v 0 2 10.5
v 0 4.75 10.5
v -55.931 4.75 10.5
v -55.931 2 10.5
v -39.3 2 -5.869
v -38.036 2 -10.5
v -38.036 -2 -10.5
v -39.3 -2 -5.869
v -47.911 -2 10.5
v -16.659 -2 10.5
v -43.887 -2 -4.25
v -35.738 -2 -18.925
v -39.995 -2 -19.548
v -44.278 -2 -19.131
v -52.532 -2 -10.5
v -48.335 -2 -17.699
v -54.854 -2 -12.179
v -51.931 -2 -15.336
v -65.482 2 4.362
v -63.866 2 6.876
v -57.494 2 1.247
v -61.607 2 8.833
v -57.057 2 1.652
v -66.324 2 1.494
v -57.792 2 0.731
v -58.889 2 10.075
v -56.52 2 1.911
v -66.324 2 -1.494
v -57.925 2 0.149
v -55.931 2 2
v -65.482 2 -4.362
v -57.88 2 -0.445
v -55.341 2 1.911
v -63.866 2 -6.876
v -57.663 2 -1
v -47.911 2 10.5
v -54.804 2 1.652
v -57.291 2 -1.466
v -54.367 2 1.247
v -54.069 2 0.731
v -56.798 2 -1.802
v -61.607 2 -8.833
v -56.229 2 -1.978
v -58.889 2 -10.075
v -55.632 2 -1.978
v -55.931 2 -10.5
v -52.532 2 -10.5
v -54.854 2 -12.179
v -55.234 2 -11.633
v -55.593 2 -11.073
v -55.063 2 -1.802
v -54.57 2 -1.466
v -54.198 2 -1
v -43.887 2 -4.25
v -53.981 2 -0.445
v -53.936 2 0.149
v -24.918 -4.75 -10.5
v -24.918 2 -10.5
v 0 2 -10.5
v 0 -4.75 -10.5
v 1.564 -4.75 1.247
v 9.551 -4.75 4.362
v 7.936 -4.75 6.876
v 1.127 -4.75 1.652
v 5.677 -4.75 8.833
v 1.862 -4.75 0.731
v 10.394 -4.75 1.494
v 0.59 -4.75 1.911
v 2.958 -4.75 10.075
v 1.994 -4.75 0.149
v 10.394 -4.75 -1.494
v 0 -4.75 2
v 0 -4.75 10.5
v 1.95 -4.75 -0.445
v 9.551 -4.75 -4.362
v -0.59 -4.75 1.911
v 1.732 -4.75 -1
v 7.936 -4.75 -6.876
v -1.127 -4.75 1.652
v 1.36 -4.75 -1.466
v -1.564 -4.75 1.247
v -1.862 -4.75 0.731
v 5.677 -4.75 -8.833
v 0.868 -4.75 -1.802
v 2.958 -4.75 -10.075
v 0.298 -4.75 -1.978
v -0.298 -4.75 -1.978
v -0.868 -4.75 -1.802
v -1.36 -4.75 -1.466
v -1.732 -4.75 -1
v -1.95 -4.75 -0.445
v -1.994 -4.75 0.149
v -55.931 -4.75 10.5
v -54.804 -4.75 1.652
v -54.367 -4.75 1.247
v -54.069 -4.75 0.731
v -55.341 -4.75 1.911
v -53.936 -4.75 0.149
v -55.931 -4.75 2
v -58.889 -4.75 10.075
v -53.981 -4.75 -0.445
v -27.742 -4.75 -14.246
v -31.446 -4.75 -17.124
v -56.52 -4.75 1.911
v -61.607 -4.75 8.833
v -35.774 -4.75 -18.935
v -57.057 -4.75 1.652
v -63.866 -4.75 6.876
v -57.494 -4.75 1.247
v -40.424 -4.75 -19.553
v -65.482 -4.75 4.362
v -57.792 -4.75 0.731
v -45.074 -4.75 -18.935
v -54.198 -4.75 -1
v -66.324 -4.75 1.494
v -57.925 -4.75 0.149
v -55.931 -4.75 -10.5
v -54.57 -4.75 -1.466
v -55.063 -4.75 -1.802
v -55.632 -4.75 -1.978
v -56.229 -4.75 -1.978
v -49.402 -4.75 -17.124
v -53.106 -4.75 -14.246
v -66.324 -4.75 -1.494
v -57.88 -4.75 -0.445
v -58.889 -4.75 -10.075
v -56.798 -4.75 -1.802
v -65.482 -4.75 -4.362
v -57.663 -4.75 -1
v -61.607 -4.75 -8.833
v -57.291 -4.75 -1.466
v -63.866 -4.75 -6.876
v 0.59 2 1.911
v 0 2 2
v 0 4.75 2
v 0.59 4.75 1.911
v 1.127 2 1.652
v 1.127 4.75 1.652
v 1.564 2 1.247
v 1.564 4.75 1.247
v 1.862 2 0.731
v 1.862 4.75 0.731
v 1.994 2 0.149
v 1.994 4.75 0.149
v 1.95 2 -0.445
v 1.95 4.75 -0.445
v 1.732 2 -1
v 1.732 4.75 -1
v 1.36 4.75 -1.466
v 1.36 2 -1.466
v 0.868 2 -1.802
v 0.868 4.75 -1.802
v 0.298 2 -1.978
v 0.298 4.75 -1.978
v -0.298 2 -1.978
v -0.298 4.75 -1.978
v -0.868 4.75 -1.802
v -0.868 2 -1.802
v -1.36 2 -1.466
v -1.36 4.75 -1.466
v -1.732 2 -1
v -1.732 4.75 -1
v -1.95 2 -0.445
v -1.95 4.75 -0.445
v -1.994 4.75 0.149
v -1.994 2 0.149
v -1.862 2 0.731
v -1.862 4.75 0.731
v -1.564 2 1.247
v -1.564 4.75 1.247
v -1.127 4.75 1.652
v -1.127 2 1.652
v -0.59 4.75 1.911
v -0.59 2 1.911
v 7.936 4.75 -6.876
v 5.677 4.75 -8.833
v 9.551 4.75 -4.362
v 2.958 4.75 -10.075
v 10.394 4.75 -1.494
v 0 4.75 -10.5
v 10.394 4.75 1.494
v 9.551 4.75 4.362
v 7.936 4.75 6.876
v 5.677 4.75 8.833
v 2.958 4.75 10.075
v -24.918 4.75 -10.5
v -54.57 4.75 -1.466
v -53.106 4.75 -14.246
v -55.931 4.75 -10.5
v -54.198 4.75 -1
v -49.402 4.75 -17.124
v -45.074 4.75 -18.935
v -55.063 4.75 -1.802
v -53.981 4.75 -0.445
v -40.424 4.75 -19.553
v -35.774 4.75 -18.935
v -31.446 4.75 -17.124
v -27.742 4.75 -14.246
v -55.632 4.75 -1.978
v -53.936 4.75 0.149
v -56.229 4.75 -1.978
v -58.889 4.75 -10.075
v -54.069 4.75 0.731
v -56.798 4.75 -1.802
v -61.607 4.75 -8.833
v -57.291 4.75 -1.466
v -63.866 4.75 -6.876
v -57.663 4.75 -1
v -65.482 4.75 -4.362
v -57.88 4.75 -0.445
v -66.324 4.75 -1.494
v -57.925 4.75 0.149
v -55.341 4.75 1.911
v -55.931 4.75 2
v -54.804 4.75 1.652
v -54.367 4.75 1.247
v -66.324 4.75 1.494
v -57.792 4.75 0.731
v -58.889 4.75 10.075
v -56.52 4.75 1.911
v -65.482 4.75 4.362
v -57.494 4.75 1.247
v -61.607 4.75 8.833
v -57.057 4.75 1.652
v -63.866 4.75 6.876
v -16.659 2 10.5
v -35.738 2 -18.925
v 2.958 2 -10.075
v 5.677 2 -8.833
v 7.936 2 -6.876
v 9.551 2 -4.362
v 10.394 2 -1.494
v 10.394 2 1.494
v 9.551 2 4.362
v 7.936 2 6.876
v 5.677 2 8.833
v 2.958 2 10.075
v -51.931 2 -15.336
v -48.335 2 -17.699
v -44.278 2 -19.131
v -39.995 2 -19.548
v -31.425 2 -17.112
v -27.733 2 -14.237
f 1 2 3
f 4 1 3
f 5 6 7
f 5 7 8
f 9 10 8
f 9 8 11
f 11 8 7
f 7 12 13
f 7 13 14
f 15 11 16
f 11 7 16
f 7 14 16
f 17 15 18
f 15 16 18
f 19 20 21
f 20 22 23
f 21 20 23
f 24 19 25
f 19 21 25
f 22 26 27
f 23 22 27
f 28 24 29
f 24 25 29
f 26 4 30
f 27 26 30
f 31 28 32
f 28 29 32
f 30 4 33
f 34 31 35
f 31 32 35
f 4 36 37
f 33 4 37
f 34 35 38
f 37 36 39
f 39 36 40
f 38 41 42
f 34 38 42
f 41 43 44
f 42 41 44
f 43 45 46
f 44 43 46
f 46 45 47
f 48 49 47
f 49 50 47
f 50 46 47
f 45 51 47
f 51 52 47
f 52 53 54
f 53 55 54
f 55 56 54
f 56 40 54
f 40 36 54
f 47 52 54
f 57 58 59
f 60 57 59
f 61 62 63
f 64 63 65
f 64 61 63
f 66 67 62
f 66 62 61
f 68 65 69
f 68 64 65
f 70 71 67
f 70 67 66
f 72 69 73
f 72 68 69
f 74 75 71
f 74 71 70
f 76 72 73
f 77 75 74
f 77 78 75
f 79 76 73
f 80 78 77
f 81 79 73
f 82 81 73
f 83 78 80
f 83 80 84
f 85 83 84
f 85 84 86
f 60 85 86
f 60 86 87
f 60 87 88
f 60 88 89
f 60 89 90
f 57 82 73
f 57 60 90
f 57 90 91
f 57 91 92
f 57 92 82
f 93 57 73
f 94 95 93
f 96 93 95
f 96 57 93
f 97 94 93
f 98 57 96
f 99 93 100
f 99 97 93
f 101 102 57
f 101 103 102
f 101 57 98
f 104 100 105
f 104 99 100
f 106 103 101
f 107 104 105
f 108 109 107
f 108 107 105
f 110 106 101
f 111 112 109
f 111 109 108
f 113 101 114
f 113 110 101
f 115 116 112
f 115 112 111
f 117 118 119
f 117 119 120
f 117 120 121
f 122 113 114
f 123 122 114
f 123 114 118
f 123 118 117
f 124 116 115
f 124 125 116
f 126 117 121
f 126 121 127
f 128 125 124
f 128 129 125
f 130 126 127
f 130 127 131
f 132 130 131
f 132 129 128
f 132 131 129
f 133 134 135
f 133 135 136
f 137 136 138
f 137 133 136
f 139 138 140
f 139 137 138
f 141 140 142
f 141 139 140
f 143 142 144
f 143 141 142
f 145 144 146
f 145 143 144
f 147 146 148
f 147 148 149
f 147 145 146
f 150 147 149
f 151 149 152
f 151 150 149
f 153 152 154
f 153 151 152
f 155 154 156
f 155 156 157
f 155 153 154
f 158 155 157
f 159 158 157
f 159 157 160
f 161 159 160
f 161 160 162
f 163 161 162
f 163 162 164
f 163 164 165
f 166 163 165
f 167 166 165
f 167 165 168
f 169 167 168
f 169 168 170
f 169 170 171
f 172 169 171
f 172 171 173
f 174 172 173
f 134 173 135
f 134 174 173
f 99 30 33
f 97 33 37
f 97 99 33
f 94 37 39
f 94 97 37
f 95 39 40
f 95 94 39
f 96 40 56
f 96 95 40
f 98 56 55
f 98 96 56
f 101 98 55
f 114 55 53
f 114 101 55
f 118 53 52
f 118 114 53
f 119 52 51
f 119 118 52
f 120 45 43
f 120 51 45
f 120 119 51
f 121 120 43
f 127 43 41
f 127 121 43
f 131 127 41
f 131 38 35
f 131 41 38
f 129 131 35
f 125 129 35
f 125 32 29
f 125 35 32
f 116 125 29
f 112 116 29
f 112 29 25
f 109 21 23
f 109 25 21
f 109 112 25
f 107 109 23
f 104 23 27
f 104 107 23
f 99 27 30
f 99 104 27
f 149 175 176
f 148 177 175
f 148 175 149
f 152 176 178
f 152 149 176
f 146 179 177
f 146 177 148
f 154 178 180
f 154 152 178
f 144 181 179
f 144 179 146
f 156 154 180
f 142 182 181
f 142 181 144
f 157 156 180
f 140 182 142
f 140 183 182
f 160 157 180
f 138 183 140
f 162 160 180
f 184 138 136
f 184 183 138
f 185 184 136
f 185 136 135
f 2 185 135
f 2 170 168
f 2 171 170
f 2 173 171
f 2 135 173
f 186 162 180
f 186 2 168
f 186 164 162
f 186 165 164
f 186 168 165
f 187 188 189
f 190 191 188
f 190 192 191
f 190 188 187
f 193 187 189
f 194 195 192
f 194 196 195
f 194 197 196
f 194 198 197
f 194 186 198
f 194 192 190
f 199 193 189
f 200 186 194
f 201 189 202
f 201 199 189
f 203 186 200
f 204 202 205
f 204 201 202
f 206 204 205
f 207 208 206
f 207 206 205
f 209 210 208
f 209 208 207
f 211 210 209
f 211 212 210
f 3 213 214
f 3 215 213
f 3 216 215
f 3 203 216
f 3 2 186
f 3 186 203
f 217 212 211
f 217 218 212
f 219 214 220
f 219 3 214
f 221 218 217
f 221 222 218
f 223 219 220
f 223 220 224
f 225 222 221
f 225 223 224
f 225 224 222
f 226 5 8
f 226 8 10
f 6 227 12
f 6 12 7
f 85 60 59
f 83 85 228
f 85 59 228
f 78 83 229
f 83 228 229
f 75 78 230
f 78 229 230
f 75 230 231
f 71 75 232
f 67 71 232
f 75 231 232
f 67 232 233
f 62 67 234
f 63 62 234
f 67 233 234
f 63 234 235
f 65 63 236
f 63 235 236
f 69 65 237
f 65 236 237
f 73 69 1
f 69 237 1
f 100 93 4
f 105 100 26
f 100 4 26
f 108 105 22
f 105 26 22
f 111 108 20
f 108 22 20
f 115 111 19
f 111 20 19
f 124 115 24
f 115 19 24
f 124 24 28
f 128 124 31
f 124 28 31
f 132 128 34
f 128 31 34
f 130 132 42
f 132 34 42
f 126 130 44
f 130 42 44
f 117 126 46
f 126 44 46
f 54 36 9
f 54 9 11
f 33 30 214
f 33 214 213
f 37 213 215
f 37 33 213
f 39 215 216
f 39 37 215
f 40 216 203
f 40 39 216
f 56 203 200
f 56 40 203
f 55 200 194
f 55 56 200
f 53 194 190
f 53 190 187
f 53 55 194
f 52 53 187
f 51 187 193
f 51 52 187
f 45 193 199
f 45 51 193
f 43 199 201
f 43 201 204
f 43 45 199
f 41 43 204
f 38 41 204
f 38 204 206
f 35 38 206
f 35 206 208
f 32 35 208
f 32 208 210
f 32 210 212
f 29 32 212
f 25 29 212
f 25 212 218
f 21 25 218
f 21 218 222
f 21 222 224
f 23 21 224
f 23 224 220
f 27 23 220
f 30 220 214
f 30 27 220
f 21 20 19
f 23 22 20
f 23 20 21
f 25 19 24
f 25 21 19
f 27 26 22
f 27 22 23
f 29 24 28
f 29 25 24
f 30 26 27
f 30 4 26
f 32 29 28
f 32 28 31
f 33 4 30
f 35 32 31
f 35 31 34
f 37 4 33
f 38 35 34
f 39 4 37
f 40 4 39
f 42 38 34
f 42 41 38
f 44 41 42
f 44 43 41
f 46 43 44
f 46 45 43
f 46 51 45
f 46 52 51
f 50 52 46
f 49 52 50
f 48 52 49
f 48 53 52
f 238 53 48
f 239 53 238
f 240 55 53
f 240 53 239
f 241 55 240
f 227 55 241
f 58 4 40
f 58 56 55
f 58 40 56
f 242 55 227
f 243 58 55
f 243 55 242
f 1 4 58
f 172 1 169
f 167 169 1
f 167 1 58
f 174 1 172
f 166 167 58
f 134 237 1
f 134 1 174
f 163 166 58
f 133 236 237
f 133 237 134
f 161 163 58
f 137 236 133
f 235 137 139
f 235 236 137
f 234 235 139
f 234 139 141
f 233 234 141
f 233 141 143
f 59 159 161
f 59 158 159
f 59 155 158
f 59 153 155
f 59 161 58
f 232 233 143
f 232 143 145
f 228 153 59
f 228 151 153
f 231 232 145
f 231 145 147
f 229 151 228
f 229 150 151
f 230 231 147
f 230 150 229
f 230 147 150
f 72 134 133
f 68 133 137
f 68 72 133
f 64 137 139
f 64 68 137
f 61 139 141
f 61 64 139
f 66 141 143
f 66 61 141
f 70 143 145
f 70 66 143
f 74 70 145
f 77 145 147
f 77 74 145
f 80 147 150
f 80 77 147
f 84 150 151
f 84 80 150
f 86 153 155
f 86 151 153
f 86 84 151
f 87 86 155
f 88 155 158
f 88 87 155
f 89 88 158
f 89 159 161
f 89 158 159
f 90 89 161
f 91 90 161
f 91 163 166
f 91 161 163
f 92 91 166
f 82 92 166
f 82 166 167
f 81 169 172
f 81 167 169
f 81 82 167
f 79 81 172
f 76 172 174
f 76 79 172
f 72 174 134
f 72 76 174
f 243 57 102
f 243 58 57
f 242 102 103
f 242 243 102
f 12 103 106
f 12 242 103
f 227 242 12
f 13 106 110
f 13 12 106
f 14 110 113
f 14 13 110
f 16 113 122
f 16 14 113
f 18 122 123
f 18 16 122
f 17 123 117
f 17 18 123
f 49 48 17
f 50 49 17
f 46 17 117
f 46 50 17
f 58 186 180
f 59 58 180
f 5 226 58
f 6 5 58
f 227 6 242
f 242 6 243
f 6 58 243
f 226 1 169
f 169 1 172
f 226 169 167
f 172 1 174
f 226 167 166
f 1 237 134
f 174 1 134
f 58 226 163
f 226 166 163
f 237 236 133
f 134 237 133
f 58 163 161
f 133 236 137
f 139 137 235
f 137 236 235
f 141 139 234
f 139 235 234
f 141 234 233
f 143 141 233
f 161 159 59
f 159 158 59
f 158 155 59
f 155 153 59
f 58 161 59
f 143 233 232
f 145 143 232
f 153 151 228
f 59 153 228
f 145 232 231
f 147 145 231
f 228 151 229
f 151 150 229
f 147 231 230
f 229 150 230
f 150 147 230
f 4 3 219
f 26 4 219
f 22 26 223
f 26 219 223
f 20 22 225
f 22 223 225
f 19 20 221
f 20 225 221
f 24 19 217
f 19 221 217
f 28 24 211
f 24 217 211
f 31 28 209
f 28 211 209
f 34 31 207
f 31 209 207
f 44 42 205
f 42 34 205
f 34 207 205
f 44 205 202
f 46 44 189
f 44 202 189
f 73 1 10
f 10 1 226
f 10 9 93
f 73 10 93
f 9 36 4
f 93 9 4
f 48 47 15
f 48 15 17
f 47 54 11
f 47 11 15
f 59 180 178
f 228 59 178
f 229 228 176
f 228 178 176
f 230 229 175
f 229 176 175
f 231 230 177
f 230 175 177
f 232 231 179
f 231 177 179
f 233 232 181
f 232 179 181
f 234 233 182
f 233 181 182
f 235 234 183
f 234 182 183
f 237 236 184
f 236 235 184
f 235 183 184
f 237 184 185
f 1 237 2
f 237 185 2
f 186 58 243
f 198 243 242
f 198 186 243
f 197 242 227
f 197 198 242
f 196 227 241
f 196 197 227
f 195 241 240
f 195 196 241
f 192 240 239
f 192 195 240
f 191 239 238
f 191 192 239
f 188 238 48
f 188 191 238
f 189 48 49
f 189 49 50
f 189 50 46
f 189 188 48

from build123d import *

# Parameters (mm, degrees)
SKETCH1_R                       = 2
BOSS_EXTRUDE1_DEPTH             = 4.75
CUT_EXTRUDE1_DEPTH              = 2
BOSS_EXTRUDE2_REACH             = 69.423
BOSS_EXTRUDE2_DIRECTION_2_REACH = 69.423
CUT_EXTRUDE2_DEPTH              = 2


with BuildPart() as part:
    # Sketch1 → Boss-Extrude1 (new, symmetric)
    with BuildSketch(Plane(origin=(0, 0, 0), x_dir=(1, 0, 0), z_dir=(0, 1, 0))):
        with BuildLine():
            Line((0, -10.500399217), (-55.93053828, -10.500399217))
            ThreePointArc((-55.93053828, -10.500399217), (-66.430937497, 0), (-55.93053828, 10.500399217))
            Line((-55.93053828, 10.500399217), (0, 10.500399217))
            ThreePointArc((0, 10.500399217), (10.500399217, 0), (0, -10.500399217))
        make_face()
        with Locations(Location((0, 0, 0), (0, 0, 270))):
            Circle(SKETCH1_R, mode=Mode.SUBTRACT)
        with Locations(Location((-55.93053828, 0, 0), (0, 0, 270))):
            Circle(SKETCH1_R, mode=Mode.SUBTRACT)
    extrude(amount=BOSS_EXTRUDE1_DEPTH, both=True)

    # Sketch3 → Cut-Extrude1 (cut, symmetric)
    with BuildSketch(Plane(origin=(0, 0, 0), x_dir=(1, 0, 0), z_dir=(0, 1, 0))):
        with BuildLine():
            Line((-35.751827911, 18.875253657), (-39.299525946, 5.868950542))
            Line((-39.299525946, 5.868950542), (26.645239155, -41.810424095))
            ThreePointArc((26.645239155, -41.810424095), (-18.563858299, -45.972421055), (-48.206523525, -11.584965354))
            Line((-48.206523525, -11.584965354), (-43.887265107, 4.249974277))
            Line((-43.887265107, 4.249974277), (-54.812276631, 12.148974547))
            ThreePointArc((-54.812276631, 12.148974547), (-46.585078234, 19.204535889), (-35.751827911, 18.875253657))
        make_face()
    extrude(amount=CUT_EXTRUDE1_DEPTH, both=True, mode=Mode.SUBTRACT)

    # Boss-Extrude2: up to this face of the body (flat: up to its plane)
    boss_extrude2_end = Plane(part.part.faces().sort_by_distance((-27.96526914, 4.75, 0))[0])
    # Sketch5 → Boss-Extrude2 (add, up to the picked face)
    with BuildSketch(Plane(origin=(0, 0, 0), x_dir=(1, 0, 0), z_dir=(0, 1, 0)), mode=Mode.PRIVATE) as boss_extrude2_sk1:
        with BuildLine():
            ThreePointArc((-24.917700351, 10.500399217), (-40.424119316, 19.553005923), (-55.93053828, 10.500399217))
            Line((-55.93053828, 10.500399217), (-24.917700351, 10.500399217))
        make_face()
    boss_extrude2_tool1 = split(extrude(boss_extrude2_sk1.sketch, amount=BOSS_EXTRUDE2_REACH, mode=Mode.PRIVATE), bisect_by=boss_extrude2_end, keep=Keep.BOTH, mode=Mode.PRIVATE)
    add(boss_extrude2_tool1.solids().sort_by(Axis((-40.424119, 0, -14.214125), (0, 1, 0)))[0])

    # Boss-Extrude2 direction 2: up to this face of the body (flat: up to its plane)
    boss_extrude2_direction_2_end = Plane(part.part.faces().sort_by_distance((-27.96526914, -4.75, 0))[0])
    # Sketch5 → Boss-Extrude2 direction 2 (add, up to the picked face)
    with BuildSketch(Plane(origin=(0, 0, 0), x_dir=(1, 0, 0), z_dir=(0, 1, 0)), mode=Mode.PRIVATE) as boss_extrude2_direction_2_sk1:
        with BuildLine():
            ThreePointArc((-24.917700351, 10.500399217), (-40.424119316, 19.553005923), (-55.93053828, 10.500399217))
            Line((-55.93053828, 10.500399217), (-24.917700351, 10.500399217))
        make_face()
    boss_extrude2_direction_2_tool1 = split(extrude(boss_extrude2_direction_2_sk1.sketch, amount=-BOSS_EXTRUDE2_DIRECTION_2_REACH, mode=Mode.PRIVATE), bisect_by=boss_extrude2_direction_2_end, keep=Keep.BOTH, mode=Mode.PRIVATE)
    add(boss_extrude2_direction_2_tool1.solids().sort_by(Axis((-40.424119, 0, -14.214125), (0, -1, 0)))[0])

    # Sketch6 → Cut-Extrude2 (cut, symmetric)
    with BuildSketch(Plane(origin=(0, 0, 0), x_dir=(1, 0, 0), z_dir=(0, 1, 0))):
        with BuildLine():
            Line((-39.299525946, 5.868950542), (-16.659276721, -10.500399217))
            Line((-16.659276721, -10.500399217), (-47.910689027, -10.500399217))
            Line((-47.910689027, -10.500399217), (-43.887265107, 4.249974277))
            Line((-43.887265107, 4.249974277), (-54.854382526, 12.179417945))
            ThreePointArc((-54.854382526, 12.179417945), (-46.349897212, 18.538096729), (-35.738154791, 18.925381021))
            Line((-35.738154791, 18.925381021), (-39.299525946, 5.868950542))
        make_face()
    extrude(amount=CUT_EXTRUDE2_DEPTH, both=True, mode=Mode.SUBTRACT)


with BuildPart() as body_2:
    # Split1: the piece on the far side of the plane
    add(part.part)
    split(bisect_by=Plane(origin=(0, 2, 0), x_dir=(0, 0, -1), z_dir=(0, -1, 0)), keep=Keep.BOTTOM)


with BuildPart() as part_1:
    add(part.part)

    # Split1
    split(bisect_by=Plane(origin=(0, 2, 0), x_dir=(0, 0, -1), z_dir=(0, -1, 0)), keep=Keep.TOP)


solid = Compound([body_2.part, part_1.part])
